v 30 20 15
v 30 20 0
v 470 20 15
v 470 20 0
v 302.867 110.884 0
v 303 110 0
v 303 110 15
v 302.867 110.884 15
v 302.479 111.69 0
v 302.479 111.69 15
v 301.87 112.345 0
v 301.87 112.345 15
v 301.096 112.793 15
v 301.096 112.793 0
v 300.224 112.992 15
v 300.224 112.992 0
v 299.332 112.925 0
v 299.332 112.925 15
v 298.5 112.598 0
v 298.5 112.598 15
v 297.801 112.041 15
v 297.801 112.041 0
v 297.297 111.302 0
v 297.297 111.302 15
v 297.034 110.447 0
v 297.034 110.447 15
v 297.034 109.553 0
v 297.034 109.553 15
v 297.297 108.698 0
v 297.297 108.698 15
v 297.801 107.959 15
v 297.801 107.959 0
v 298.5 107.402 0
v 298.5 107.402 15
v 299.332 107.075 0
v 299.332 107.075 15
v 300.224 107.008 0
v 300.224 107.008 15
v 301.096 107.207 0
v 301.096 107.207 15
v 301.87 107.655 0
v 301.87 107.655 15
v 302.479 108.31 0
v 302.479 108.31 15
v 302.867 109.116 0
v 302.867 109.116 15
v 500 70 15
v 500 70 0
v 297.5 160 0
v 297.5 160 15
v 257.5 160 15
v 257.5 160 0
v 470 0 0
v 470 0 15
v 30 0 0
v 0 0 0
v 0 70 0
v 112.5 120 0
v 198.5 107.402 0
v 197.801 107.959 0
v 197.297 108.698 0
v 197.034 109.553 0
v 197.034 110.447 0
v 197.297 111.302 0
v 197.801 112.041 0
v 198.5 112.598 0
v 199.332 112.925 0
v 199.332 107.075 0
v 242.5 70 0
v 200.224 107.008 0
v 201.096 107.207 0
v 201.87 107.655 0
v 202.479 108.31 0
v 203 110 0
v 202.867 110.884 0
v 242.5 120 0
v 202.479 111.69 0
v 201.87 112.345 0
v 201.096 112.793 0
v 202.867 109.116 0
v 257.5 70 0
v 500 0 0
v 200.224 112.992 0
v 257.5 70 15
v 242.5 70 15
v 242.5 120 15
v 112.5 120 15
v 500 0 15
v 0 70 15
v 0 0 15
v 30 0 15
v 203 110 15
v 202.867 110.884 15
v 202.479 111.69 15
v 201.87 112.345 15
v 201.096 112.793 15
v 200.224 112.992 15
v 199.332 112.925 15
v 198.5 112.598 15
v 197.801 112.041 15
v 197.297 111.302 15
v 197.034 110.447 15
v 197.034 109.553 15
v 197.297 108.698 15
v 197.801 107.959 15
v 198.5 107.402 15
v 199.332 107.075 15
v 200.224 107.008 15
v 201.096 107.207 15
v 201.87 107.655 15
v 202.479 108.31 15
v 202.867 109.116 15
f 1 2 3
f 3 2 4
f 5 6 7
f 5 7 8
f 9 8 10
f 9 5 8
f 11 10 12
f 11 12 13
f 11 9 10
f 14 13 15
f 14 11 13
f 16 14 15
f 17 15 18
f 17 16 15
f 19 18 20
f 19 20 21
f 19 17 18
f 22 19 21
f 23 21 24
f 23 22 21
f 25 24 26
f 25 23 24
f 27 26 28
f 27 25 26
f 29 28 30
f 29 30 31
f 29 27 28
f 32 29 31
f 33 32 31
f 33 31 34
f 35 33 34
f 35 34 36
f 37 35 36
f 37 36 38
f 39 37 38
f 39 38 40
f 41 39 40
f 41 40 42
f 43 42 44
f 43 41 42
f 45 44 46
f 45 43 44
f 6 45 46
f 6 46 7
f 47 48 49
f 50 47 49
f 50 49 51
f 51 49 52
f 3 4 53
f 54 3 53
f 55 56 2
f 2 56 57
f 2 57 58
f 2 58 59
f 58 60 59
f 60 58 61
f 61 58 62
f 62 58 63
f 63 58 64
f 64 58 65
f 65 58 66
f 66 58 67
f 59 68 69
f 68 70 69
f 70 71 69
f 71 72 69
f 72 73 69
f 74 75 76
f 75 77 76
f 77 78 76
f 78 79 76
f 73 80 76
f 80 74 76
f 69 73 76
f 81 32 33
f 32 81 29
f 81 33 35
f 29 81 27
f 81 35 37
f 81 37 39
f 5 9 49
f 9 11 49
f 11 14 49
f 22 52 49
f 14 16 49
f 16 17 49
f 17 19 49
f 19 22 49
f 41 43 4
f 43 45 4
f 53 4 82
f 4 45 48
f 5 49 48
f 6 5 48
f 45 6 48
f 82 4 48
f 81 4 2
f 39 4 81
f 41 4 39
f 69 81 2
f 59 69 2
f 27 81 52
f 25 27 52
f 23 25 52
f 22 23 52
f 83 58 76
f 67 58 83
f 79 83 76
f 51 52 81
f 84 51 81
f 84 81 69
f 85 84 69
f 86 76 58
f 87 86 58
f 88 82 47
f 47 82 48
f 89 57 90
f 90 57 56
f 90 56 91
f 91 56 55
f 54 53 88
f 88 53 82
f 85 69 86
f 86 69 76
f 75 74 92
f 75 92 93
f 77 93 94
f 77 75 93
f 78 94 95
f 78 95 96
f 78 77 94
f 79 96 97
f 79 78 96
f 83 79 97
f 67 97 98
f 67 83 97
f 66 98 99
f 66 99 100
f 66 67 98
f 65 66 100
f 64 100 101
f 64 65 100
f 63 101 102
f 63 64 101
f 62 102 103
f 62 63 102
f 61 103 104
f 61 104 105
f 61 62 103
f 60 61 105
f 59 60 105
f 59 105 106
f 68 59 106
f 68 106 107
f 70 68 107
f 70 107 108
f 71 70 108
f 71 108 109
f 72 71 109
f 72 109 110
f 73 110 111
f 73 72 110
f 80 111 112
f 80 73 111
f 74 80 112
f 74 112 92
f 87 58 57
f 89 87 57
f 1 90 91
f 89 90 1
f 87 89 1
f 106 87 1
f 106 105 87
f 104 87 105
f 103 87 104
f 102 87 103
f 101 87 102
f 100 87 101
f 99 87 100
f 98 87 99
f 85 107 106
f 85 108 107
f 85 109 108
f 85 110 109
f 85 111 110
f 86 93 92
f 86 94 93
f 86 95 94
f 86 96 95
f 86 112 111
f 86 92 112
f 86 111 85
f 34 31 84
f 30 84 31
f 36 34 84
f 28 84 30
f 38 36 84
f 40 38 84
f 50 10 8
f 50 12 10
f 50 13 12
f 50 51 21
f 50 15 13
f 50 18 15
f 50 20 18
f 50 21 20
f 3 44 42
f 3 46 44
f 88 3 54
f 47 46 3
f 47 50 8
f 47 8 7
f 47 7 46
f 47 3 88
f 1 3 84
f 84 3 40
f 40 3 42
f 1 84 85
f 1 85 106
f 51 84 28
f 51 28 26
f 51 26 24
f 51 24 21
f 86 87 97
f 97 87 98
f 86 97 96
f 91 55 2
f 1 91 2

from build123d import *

# Parameters (mm, degrees)
ESQUISSE1_R        = 3
BOSS_EXTRU_1_DEPTH = 15


with BuildPart() as part:
    # Esquisse1 → Boss.-Extru.1 (new body)
    with BuildSketch(Plane.XY):
        Polygon((0, 0), (30, 0), (30, 20), (470, 20), (470, 0), (500, 0), (500, 70), (297.5, 160), (257.5, 160), (257.5, 70), (242.5, 70), (242.5, 120), (112.5, 120), (0, 70), align=None)
        with Locations((200, 110)):
            Circle(ESQUISSE1_R, mode=Mode.SUBTRACT)
        with Locations((300, 110)):
            Circle(ESQUISSE1_R, mode=Mode.SUBTRACT)
    extrude(amount=BOSS_EXTRU_1_DEPTH)


solid = part.part
